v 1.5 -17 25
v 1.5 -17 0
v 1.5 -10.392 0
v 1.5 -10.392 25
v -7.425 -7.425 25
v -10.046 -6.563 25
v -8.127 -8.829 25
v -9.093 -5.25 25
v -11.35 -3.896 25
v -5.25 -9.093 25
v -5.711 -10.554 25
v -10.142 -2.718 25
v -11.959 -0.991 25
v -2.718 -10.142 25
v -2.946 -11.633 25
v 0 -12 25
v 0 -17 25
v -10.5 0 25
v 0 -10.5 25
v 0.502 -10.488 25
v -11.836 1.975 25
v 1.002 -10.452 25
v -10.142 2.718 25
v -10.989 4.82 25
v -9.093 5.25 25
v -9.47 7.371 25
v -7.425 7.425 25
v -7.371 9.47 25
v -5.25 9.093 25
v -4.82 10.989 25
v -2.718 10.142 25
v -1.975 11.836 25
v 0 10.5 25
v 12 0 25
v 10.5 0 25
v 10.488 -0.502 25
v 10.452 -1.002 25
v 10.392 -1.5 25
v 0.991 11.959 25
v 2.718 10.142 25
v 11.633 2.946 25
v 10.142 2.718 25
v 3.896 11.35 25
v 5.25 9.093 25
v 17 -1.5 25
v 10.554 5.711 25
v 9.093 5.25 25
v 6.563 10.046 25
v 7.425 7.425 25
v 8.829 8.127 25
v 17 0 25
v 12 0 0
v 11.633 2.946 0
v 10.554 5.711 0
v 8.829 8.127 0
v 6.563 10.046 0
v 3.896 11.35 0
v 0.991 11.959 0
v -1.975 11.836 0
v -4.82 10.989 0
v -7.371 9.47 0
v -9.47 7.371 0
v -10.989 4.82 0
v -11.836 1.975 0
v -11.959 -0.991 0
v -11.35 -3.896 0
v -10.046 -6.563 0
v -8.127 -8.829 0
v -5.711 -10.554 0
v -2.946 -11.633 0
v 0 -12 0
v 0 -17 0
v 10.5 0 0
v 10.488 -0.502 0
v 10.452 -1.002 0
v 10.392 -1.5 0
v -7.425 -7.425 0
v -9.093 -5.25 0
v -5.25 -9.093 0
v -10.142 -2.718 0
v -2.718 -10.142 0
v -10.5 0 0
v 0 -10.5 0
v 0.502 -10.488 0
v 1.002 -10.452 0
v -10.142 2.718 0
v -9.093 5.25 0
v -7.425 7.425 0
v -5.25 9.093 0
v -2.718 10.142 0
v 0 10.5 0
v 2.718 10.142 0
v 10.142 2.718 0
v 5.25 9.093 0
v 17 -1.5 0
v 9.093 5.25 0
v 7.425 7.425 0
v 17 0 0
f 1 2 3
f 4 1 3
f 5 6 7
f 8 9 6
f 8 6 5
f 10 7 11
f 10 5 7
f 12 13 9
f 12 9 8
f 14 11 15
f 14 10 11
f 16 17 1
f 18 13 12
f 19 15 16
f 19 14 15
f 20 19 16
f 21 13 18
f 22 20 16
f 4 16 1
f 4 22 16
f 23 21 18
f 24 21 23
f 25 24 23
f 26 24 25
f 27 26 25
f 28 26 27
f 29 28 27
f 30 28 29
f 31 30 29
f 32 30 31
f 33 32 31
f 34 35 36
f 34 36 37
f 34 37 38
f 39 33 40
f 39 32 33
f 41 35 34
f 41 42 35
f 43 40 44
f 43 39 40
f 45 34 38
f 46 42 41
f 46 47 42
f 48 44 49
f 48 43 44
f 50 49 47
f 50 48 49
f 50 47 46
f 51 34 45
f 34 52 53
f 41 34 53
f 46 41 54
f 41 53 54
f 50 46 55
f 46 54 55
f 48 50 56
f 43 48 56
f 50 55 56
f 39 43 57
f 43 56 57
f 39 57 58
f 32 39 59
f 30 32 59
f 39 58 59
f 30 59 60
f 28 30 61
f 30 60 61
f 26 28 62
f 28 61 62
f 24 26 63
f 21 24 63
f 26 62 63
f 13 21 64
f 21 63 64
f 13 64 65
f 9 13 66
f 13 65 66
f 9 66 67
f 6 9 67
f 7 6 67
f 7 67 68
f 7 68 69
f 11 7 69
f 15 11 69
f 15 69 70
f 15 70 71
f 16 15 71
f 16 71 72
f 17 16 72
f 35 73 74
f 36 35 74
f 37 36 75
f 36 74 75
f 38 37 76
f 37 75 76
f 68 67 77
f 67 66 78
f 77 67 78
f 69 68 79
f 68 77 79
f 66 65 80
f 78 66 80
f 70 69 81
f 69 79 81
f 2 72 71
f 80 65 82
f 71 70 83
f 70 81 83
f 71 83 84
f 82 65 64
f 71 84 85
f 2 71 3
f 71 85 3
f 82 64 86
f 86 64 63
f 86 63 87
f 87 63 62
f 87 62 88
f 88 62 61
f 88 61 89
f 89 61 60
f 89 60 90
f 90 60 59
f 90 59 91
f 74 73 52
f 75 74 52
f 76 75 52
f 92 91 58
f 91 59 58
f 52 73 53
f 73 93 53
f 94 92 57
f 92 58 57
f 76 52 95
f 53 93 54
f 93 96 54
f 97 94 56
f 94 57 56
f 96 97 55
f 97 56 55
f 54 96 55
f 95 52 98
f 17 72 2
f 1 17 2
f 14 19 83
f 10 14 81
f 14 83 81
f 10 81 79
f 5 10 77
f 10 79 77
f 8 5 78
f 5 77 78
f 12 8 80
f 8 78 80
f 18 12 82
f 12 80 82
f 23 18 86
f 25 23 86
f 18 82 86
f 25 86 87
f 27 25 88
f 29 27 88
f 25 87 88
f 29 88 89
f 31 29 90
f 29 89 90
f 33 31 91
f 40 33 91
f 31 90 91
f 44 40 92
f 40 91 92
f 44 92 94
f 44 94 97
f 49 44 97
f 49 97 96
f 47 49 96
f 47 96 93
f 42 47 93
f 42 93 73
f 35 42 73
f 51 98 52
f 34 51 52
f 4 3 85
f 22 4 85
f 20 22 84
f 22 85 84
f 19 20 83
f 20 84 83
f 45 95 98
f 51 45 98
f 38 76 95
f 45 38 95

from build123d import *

# Parameters (mm, degrees)
F1_DEPTH = 25


with BuildPart() as f1:
    # F0 (on Top) → F1 (new body)
    with BuildSketch(Plane.XY):
        with BuildLine():
            ThreePointArc((0, -10.5), (-7.4246212025, 7.4246212025), (10.5, 0))
            Line((10.5, 0), (12, 0))
            ThreePointArc((12, 0), (-8.4852813742, 8.4852813742), (0, -12))
            Line((0, -12), (0, -10.5))
        make_face()
        with BuildLine():
            Line((12, 0), (10.5, 0))
            ThreePointArc((10.5, 0), (10.473041604, -0.7519305564), (10.3923048454, -1.5))
            Line((10.3923048454, -1.5), (11.9058808998, -1.5))
            ThreePointArc((11.9058808998, -1.5), (11.9764471108, -0.7514749505), (12, 0))
        make_face()
        with BuildLine():
            Line((17, 0), (12, 0))
            ThreePointArc((12, 0), (11.9764471108, -0.7514749505), (11.9058808998, -1.5))
            Line((11.9058808998, -1.5), (17, -1.5))
            Line((17, -1.5), (17, 0))
        make_face()
        with BuildLine():
            ThreePointArc((1.5, -10.3923048454), (0.7519305564, -10.473041604), (0, -10.5))
            Line((0, -10.5), (0, -12))
            ThreePointArc((0, -12), (0.7514749505, -11.9764471108), (1.5, -11.9058808998))
            Line((1.5, -11.9058808998), (1.5, -10.3923048454))
        make_face()
        with BuildLine():
            ThreePointArc((1.5, -11.9058808998), (0.7514749505, -11.9764471108), (0, -12))
            Line((0, -12), (0, -17))
            Line((0, -17), (1.5, -17))
            Line((1.5, -17), (1.5, -11.9058808998))
        make_face()
    extrude(amount=F1_DEPTH)


solid = f1.part
